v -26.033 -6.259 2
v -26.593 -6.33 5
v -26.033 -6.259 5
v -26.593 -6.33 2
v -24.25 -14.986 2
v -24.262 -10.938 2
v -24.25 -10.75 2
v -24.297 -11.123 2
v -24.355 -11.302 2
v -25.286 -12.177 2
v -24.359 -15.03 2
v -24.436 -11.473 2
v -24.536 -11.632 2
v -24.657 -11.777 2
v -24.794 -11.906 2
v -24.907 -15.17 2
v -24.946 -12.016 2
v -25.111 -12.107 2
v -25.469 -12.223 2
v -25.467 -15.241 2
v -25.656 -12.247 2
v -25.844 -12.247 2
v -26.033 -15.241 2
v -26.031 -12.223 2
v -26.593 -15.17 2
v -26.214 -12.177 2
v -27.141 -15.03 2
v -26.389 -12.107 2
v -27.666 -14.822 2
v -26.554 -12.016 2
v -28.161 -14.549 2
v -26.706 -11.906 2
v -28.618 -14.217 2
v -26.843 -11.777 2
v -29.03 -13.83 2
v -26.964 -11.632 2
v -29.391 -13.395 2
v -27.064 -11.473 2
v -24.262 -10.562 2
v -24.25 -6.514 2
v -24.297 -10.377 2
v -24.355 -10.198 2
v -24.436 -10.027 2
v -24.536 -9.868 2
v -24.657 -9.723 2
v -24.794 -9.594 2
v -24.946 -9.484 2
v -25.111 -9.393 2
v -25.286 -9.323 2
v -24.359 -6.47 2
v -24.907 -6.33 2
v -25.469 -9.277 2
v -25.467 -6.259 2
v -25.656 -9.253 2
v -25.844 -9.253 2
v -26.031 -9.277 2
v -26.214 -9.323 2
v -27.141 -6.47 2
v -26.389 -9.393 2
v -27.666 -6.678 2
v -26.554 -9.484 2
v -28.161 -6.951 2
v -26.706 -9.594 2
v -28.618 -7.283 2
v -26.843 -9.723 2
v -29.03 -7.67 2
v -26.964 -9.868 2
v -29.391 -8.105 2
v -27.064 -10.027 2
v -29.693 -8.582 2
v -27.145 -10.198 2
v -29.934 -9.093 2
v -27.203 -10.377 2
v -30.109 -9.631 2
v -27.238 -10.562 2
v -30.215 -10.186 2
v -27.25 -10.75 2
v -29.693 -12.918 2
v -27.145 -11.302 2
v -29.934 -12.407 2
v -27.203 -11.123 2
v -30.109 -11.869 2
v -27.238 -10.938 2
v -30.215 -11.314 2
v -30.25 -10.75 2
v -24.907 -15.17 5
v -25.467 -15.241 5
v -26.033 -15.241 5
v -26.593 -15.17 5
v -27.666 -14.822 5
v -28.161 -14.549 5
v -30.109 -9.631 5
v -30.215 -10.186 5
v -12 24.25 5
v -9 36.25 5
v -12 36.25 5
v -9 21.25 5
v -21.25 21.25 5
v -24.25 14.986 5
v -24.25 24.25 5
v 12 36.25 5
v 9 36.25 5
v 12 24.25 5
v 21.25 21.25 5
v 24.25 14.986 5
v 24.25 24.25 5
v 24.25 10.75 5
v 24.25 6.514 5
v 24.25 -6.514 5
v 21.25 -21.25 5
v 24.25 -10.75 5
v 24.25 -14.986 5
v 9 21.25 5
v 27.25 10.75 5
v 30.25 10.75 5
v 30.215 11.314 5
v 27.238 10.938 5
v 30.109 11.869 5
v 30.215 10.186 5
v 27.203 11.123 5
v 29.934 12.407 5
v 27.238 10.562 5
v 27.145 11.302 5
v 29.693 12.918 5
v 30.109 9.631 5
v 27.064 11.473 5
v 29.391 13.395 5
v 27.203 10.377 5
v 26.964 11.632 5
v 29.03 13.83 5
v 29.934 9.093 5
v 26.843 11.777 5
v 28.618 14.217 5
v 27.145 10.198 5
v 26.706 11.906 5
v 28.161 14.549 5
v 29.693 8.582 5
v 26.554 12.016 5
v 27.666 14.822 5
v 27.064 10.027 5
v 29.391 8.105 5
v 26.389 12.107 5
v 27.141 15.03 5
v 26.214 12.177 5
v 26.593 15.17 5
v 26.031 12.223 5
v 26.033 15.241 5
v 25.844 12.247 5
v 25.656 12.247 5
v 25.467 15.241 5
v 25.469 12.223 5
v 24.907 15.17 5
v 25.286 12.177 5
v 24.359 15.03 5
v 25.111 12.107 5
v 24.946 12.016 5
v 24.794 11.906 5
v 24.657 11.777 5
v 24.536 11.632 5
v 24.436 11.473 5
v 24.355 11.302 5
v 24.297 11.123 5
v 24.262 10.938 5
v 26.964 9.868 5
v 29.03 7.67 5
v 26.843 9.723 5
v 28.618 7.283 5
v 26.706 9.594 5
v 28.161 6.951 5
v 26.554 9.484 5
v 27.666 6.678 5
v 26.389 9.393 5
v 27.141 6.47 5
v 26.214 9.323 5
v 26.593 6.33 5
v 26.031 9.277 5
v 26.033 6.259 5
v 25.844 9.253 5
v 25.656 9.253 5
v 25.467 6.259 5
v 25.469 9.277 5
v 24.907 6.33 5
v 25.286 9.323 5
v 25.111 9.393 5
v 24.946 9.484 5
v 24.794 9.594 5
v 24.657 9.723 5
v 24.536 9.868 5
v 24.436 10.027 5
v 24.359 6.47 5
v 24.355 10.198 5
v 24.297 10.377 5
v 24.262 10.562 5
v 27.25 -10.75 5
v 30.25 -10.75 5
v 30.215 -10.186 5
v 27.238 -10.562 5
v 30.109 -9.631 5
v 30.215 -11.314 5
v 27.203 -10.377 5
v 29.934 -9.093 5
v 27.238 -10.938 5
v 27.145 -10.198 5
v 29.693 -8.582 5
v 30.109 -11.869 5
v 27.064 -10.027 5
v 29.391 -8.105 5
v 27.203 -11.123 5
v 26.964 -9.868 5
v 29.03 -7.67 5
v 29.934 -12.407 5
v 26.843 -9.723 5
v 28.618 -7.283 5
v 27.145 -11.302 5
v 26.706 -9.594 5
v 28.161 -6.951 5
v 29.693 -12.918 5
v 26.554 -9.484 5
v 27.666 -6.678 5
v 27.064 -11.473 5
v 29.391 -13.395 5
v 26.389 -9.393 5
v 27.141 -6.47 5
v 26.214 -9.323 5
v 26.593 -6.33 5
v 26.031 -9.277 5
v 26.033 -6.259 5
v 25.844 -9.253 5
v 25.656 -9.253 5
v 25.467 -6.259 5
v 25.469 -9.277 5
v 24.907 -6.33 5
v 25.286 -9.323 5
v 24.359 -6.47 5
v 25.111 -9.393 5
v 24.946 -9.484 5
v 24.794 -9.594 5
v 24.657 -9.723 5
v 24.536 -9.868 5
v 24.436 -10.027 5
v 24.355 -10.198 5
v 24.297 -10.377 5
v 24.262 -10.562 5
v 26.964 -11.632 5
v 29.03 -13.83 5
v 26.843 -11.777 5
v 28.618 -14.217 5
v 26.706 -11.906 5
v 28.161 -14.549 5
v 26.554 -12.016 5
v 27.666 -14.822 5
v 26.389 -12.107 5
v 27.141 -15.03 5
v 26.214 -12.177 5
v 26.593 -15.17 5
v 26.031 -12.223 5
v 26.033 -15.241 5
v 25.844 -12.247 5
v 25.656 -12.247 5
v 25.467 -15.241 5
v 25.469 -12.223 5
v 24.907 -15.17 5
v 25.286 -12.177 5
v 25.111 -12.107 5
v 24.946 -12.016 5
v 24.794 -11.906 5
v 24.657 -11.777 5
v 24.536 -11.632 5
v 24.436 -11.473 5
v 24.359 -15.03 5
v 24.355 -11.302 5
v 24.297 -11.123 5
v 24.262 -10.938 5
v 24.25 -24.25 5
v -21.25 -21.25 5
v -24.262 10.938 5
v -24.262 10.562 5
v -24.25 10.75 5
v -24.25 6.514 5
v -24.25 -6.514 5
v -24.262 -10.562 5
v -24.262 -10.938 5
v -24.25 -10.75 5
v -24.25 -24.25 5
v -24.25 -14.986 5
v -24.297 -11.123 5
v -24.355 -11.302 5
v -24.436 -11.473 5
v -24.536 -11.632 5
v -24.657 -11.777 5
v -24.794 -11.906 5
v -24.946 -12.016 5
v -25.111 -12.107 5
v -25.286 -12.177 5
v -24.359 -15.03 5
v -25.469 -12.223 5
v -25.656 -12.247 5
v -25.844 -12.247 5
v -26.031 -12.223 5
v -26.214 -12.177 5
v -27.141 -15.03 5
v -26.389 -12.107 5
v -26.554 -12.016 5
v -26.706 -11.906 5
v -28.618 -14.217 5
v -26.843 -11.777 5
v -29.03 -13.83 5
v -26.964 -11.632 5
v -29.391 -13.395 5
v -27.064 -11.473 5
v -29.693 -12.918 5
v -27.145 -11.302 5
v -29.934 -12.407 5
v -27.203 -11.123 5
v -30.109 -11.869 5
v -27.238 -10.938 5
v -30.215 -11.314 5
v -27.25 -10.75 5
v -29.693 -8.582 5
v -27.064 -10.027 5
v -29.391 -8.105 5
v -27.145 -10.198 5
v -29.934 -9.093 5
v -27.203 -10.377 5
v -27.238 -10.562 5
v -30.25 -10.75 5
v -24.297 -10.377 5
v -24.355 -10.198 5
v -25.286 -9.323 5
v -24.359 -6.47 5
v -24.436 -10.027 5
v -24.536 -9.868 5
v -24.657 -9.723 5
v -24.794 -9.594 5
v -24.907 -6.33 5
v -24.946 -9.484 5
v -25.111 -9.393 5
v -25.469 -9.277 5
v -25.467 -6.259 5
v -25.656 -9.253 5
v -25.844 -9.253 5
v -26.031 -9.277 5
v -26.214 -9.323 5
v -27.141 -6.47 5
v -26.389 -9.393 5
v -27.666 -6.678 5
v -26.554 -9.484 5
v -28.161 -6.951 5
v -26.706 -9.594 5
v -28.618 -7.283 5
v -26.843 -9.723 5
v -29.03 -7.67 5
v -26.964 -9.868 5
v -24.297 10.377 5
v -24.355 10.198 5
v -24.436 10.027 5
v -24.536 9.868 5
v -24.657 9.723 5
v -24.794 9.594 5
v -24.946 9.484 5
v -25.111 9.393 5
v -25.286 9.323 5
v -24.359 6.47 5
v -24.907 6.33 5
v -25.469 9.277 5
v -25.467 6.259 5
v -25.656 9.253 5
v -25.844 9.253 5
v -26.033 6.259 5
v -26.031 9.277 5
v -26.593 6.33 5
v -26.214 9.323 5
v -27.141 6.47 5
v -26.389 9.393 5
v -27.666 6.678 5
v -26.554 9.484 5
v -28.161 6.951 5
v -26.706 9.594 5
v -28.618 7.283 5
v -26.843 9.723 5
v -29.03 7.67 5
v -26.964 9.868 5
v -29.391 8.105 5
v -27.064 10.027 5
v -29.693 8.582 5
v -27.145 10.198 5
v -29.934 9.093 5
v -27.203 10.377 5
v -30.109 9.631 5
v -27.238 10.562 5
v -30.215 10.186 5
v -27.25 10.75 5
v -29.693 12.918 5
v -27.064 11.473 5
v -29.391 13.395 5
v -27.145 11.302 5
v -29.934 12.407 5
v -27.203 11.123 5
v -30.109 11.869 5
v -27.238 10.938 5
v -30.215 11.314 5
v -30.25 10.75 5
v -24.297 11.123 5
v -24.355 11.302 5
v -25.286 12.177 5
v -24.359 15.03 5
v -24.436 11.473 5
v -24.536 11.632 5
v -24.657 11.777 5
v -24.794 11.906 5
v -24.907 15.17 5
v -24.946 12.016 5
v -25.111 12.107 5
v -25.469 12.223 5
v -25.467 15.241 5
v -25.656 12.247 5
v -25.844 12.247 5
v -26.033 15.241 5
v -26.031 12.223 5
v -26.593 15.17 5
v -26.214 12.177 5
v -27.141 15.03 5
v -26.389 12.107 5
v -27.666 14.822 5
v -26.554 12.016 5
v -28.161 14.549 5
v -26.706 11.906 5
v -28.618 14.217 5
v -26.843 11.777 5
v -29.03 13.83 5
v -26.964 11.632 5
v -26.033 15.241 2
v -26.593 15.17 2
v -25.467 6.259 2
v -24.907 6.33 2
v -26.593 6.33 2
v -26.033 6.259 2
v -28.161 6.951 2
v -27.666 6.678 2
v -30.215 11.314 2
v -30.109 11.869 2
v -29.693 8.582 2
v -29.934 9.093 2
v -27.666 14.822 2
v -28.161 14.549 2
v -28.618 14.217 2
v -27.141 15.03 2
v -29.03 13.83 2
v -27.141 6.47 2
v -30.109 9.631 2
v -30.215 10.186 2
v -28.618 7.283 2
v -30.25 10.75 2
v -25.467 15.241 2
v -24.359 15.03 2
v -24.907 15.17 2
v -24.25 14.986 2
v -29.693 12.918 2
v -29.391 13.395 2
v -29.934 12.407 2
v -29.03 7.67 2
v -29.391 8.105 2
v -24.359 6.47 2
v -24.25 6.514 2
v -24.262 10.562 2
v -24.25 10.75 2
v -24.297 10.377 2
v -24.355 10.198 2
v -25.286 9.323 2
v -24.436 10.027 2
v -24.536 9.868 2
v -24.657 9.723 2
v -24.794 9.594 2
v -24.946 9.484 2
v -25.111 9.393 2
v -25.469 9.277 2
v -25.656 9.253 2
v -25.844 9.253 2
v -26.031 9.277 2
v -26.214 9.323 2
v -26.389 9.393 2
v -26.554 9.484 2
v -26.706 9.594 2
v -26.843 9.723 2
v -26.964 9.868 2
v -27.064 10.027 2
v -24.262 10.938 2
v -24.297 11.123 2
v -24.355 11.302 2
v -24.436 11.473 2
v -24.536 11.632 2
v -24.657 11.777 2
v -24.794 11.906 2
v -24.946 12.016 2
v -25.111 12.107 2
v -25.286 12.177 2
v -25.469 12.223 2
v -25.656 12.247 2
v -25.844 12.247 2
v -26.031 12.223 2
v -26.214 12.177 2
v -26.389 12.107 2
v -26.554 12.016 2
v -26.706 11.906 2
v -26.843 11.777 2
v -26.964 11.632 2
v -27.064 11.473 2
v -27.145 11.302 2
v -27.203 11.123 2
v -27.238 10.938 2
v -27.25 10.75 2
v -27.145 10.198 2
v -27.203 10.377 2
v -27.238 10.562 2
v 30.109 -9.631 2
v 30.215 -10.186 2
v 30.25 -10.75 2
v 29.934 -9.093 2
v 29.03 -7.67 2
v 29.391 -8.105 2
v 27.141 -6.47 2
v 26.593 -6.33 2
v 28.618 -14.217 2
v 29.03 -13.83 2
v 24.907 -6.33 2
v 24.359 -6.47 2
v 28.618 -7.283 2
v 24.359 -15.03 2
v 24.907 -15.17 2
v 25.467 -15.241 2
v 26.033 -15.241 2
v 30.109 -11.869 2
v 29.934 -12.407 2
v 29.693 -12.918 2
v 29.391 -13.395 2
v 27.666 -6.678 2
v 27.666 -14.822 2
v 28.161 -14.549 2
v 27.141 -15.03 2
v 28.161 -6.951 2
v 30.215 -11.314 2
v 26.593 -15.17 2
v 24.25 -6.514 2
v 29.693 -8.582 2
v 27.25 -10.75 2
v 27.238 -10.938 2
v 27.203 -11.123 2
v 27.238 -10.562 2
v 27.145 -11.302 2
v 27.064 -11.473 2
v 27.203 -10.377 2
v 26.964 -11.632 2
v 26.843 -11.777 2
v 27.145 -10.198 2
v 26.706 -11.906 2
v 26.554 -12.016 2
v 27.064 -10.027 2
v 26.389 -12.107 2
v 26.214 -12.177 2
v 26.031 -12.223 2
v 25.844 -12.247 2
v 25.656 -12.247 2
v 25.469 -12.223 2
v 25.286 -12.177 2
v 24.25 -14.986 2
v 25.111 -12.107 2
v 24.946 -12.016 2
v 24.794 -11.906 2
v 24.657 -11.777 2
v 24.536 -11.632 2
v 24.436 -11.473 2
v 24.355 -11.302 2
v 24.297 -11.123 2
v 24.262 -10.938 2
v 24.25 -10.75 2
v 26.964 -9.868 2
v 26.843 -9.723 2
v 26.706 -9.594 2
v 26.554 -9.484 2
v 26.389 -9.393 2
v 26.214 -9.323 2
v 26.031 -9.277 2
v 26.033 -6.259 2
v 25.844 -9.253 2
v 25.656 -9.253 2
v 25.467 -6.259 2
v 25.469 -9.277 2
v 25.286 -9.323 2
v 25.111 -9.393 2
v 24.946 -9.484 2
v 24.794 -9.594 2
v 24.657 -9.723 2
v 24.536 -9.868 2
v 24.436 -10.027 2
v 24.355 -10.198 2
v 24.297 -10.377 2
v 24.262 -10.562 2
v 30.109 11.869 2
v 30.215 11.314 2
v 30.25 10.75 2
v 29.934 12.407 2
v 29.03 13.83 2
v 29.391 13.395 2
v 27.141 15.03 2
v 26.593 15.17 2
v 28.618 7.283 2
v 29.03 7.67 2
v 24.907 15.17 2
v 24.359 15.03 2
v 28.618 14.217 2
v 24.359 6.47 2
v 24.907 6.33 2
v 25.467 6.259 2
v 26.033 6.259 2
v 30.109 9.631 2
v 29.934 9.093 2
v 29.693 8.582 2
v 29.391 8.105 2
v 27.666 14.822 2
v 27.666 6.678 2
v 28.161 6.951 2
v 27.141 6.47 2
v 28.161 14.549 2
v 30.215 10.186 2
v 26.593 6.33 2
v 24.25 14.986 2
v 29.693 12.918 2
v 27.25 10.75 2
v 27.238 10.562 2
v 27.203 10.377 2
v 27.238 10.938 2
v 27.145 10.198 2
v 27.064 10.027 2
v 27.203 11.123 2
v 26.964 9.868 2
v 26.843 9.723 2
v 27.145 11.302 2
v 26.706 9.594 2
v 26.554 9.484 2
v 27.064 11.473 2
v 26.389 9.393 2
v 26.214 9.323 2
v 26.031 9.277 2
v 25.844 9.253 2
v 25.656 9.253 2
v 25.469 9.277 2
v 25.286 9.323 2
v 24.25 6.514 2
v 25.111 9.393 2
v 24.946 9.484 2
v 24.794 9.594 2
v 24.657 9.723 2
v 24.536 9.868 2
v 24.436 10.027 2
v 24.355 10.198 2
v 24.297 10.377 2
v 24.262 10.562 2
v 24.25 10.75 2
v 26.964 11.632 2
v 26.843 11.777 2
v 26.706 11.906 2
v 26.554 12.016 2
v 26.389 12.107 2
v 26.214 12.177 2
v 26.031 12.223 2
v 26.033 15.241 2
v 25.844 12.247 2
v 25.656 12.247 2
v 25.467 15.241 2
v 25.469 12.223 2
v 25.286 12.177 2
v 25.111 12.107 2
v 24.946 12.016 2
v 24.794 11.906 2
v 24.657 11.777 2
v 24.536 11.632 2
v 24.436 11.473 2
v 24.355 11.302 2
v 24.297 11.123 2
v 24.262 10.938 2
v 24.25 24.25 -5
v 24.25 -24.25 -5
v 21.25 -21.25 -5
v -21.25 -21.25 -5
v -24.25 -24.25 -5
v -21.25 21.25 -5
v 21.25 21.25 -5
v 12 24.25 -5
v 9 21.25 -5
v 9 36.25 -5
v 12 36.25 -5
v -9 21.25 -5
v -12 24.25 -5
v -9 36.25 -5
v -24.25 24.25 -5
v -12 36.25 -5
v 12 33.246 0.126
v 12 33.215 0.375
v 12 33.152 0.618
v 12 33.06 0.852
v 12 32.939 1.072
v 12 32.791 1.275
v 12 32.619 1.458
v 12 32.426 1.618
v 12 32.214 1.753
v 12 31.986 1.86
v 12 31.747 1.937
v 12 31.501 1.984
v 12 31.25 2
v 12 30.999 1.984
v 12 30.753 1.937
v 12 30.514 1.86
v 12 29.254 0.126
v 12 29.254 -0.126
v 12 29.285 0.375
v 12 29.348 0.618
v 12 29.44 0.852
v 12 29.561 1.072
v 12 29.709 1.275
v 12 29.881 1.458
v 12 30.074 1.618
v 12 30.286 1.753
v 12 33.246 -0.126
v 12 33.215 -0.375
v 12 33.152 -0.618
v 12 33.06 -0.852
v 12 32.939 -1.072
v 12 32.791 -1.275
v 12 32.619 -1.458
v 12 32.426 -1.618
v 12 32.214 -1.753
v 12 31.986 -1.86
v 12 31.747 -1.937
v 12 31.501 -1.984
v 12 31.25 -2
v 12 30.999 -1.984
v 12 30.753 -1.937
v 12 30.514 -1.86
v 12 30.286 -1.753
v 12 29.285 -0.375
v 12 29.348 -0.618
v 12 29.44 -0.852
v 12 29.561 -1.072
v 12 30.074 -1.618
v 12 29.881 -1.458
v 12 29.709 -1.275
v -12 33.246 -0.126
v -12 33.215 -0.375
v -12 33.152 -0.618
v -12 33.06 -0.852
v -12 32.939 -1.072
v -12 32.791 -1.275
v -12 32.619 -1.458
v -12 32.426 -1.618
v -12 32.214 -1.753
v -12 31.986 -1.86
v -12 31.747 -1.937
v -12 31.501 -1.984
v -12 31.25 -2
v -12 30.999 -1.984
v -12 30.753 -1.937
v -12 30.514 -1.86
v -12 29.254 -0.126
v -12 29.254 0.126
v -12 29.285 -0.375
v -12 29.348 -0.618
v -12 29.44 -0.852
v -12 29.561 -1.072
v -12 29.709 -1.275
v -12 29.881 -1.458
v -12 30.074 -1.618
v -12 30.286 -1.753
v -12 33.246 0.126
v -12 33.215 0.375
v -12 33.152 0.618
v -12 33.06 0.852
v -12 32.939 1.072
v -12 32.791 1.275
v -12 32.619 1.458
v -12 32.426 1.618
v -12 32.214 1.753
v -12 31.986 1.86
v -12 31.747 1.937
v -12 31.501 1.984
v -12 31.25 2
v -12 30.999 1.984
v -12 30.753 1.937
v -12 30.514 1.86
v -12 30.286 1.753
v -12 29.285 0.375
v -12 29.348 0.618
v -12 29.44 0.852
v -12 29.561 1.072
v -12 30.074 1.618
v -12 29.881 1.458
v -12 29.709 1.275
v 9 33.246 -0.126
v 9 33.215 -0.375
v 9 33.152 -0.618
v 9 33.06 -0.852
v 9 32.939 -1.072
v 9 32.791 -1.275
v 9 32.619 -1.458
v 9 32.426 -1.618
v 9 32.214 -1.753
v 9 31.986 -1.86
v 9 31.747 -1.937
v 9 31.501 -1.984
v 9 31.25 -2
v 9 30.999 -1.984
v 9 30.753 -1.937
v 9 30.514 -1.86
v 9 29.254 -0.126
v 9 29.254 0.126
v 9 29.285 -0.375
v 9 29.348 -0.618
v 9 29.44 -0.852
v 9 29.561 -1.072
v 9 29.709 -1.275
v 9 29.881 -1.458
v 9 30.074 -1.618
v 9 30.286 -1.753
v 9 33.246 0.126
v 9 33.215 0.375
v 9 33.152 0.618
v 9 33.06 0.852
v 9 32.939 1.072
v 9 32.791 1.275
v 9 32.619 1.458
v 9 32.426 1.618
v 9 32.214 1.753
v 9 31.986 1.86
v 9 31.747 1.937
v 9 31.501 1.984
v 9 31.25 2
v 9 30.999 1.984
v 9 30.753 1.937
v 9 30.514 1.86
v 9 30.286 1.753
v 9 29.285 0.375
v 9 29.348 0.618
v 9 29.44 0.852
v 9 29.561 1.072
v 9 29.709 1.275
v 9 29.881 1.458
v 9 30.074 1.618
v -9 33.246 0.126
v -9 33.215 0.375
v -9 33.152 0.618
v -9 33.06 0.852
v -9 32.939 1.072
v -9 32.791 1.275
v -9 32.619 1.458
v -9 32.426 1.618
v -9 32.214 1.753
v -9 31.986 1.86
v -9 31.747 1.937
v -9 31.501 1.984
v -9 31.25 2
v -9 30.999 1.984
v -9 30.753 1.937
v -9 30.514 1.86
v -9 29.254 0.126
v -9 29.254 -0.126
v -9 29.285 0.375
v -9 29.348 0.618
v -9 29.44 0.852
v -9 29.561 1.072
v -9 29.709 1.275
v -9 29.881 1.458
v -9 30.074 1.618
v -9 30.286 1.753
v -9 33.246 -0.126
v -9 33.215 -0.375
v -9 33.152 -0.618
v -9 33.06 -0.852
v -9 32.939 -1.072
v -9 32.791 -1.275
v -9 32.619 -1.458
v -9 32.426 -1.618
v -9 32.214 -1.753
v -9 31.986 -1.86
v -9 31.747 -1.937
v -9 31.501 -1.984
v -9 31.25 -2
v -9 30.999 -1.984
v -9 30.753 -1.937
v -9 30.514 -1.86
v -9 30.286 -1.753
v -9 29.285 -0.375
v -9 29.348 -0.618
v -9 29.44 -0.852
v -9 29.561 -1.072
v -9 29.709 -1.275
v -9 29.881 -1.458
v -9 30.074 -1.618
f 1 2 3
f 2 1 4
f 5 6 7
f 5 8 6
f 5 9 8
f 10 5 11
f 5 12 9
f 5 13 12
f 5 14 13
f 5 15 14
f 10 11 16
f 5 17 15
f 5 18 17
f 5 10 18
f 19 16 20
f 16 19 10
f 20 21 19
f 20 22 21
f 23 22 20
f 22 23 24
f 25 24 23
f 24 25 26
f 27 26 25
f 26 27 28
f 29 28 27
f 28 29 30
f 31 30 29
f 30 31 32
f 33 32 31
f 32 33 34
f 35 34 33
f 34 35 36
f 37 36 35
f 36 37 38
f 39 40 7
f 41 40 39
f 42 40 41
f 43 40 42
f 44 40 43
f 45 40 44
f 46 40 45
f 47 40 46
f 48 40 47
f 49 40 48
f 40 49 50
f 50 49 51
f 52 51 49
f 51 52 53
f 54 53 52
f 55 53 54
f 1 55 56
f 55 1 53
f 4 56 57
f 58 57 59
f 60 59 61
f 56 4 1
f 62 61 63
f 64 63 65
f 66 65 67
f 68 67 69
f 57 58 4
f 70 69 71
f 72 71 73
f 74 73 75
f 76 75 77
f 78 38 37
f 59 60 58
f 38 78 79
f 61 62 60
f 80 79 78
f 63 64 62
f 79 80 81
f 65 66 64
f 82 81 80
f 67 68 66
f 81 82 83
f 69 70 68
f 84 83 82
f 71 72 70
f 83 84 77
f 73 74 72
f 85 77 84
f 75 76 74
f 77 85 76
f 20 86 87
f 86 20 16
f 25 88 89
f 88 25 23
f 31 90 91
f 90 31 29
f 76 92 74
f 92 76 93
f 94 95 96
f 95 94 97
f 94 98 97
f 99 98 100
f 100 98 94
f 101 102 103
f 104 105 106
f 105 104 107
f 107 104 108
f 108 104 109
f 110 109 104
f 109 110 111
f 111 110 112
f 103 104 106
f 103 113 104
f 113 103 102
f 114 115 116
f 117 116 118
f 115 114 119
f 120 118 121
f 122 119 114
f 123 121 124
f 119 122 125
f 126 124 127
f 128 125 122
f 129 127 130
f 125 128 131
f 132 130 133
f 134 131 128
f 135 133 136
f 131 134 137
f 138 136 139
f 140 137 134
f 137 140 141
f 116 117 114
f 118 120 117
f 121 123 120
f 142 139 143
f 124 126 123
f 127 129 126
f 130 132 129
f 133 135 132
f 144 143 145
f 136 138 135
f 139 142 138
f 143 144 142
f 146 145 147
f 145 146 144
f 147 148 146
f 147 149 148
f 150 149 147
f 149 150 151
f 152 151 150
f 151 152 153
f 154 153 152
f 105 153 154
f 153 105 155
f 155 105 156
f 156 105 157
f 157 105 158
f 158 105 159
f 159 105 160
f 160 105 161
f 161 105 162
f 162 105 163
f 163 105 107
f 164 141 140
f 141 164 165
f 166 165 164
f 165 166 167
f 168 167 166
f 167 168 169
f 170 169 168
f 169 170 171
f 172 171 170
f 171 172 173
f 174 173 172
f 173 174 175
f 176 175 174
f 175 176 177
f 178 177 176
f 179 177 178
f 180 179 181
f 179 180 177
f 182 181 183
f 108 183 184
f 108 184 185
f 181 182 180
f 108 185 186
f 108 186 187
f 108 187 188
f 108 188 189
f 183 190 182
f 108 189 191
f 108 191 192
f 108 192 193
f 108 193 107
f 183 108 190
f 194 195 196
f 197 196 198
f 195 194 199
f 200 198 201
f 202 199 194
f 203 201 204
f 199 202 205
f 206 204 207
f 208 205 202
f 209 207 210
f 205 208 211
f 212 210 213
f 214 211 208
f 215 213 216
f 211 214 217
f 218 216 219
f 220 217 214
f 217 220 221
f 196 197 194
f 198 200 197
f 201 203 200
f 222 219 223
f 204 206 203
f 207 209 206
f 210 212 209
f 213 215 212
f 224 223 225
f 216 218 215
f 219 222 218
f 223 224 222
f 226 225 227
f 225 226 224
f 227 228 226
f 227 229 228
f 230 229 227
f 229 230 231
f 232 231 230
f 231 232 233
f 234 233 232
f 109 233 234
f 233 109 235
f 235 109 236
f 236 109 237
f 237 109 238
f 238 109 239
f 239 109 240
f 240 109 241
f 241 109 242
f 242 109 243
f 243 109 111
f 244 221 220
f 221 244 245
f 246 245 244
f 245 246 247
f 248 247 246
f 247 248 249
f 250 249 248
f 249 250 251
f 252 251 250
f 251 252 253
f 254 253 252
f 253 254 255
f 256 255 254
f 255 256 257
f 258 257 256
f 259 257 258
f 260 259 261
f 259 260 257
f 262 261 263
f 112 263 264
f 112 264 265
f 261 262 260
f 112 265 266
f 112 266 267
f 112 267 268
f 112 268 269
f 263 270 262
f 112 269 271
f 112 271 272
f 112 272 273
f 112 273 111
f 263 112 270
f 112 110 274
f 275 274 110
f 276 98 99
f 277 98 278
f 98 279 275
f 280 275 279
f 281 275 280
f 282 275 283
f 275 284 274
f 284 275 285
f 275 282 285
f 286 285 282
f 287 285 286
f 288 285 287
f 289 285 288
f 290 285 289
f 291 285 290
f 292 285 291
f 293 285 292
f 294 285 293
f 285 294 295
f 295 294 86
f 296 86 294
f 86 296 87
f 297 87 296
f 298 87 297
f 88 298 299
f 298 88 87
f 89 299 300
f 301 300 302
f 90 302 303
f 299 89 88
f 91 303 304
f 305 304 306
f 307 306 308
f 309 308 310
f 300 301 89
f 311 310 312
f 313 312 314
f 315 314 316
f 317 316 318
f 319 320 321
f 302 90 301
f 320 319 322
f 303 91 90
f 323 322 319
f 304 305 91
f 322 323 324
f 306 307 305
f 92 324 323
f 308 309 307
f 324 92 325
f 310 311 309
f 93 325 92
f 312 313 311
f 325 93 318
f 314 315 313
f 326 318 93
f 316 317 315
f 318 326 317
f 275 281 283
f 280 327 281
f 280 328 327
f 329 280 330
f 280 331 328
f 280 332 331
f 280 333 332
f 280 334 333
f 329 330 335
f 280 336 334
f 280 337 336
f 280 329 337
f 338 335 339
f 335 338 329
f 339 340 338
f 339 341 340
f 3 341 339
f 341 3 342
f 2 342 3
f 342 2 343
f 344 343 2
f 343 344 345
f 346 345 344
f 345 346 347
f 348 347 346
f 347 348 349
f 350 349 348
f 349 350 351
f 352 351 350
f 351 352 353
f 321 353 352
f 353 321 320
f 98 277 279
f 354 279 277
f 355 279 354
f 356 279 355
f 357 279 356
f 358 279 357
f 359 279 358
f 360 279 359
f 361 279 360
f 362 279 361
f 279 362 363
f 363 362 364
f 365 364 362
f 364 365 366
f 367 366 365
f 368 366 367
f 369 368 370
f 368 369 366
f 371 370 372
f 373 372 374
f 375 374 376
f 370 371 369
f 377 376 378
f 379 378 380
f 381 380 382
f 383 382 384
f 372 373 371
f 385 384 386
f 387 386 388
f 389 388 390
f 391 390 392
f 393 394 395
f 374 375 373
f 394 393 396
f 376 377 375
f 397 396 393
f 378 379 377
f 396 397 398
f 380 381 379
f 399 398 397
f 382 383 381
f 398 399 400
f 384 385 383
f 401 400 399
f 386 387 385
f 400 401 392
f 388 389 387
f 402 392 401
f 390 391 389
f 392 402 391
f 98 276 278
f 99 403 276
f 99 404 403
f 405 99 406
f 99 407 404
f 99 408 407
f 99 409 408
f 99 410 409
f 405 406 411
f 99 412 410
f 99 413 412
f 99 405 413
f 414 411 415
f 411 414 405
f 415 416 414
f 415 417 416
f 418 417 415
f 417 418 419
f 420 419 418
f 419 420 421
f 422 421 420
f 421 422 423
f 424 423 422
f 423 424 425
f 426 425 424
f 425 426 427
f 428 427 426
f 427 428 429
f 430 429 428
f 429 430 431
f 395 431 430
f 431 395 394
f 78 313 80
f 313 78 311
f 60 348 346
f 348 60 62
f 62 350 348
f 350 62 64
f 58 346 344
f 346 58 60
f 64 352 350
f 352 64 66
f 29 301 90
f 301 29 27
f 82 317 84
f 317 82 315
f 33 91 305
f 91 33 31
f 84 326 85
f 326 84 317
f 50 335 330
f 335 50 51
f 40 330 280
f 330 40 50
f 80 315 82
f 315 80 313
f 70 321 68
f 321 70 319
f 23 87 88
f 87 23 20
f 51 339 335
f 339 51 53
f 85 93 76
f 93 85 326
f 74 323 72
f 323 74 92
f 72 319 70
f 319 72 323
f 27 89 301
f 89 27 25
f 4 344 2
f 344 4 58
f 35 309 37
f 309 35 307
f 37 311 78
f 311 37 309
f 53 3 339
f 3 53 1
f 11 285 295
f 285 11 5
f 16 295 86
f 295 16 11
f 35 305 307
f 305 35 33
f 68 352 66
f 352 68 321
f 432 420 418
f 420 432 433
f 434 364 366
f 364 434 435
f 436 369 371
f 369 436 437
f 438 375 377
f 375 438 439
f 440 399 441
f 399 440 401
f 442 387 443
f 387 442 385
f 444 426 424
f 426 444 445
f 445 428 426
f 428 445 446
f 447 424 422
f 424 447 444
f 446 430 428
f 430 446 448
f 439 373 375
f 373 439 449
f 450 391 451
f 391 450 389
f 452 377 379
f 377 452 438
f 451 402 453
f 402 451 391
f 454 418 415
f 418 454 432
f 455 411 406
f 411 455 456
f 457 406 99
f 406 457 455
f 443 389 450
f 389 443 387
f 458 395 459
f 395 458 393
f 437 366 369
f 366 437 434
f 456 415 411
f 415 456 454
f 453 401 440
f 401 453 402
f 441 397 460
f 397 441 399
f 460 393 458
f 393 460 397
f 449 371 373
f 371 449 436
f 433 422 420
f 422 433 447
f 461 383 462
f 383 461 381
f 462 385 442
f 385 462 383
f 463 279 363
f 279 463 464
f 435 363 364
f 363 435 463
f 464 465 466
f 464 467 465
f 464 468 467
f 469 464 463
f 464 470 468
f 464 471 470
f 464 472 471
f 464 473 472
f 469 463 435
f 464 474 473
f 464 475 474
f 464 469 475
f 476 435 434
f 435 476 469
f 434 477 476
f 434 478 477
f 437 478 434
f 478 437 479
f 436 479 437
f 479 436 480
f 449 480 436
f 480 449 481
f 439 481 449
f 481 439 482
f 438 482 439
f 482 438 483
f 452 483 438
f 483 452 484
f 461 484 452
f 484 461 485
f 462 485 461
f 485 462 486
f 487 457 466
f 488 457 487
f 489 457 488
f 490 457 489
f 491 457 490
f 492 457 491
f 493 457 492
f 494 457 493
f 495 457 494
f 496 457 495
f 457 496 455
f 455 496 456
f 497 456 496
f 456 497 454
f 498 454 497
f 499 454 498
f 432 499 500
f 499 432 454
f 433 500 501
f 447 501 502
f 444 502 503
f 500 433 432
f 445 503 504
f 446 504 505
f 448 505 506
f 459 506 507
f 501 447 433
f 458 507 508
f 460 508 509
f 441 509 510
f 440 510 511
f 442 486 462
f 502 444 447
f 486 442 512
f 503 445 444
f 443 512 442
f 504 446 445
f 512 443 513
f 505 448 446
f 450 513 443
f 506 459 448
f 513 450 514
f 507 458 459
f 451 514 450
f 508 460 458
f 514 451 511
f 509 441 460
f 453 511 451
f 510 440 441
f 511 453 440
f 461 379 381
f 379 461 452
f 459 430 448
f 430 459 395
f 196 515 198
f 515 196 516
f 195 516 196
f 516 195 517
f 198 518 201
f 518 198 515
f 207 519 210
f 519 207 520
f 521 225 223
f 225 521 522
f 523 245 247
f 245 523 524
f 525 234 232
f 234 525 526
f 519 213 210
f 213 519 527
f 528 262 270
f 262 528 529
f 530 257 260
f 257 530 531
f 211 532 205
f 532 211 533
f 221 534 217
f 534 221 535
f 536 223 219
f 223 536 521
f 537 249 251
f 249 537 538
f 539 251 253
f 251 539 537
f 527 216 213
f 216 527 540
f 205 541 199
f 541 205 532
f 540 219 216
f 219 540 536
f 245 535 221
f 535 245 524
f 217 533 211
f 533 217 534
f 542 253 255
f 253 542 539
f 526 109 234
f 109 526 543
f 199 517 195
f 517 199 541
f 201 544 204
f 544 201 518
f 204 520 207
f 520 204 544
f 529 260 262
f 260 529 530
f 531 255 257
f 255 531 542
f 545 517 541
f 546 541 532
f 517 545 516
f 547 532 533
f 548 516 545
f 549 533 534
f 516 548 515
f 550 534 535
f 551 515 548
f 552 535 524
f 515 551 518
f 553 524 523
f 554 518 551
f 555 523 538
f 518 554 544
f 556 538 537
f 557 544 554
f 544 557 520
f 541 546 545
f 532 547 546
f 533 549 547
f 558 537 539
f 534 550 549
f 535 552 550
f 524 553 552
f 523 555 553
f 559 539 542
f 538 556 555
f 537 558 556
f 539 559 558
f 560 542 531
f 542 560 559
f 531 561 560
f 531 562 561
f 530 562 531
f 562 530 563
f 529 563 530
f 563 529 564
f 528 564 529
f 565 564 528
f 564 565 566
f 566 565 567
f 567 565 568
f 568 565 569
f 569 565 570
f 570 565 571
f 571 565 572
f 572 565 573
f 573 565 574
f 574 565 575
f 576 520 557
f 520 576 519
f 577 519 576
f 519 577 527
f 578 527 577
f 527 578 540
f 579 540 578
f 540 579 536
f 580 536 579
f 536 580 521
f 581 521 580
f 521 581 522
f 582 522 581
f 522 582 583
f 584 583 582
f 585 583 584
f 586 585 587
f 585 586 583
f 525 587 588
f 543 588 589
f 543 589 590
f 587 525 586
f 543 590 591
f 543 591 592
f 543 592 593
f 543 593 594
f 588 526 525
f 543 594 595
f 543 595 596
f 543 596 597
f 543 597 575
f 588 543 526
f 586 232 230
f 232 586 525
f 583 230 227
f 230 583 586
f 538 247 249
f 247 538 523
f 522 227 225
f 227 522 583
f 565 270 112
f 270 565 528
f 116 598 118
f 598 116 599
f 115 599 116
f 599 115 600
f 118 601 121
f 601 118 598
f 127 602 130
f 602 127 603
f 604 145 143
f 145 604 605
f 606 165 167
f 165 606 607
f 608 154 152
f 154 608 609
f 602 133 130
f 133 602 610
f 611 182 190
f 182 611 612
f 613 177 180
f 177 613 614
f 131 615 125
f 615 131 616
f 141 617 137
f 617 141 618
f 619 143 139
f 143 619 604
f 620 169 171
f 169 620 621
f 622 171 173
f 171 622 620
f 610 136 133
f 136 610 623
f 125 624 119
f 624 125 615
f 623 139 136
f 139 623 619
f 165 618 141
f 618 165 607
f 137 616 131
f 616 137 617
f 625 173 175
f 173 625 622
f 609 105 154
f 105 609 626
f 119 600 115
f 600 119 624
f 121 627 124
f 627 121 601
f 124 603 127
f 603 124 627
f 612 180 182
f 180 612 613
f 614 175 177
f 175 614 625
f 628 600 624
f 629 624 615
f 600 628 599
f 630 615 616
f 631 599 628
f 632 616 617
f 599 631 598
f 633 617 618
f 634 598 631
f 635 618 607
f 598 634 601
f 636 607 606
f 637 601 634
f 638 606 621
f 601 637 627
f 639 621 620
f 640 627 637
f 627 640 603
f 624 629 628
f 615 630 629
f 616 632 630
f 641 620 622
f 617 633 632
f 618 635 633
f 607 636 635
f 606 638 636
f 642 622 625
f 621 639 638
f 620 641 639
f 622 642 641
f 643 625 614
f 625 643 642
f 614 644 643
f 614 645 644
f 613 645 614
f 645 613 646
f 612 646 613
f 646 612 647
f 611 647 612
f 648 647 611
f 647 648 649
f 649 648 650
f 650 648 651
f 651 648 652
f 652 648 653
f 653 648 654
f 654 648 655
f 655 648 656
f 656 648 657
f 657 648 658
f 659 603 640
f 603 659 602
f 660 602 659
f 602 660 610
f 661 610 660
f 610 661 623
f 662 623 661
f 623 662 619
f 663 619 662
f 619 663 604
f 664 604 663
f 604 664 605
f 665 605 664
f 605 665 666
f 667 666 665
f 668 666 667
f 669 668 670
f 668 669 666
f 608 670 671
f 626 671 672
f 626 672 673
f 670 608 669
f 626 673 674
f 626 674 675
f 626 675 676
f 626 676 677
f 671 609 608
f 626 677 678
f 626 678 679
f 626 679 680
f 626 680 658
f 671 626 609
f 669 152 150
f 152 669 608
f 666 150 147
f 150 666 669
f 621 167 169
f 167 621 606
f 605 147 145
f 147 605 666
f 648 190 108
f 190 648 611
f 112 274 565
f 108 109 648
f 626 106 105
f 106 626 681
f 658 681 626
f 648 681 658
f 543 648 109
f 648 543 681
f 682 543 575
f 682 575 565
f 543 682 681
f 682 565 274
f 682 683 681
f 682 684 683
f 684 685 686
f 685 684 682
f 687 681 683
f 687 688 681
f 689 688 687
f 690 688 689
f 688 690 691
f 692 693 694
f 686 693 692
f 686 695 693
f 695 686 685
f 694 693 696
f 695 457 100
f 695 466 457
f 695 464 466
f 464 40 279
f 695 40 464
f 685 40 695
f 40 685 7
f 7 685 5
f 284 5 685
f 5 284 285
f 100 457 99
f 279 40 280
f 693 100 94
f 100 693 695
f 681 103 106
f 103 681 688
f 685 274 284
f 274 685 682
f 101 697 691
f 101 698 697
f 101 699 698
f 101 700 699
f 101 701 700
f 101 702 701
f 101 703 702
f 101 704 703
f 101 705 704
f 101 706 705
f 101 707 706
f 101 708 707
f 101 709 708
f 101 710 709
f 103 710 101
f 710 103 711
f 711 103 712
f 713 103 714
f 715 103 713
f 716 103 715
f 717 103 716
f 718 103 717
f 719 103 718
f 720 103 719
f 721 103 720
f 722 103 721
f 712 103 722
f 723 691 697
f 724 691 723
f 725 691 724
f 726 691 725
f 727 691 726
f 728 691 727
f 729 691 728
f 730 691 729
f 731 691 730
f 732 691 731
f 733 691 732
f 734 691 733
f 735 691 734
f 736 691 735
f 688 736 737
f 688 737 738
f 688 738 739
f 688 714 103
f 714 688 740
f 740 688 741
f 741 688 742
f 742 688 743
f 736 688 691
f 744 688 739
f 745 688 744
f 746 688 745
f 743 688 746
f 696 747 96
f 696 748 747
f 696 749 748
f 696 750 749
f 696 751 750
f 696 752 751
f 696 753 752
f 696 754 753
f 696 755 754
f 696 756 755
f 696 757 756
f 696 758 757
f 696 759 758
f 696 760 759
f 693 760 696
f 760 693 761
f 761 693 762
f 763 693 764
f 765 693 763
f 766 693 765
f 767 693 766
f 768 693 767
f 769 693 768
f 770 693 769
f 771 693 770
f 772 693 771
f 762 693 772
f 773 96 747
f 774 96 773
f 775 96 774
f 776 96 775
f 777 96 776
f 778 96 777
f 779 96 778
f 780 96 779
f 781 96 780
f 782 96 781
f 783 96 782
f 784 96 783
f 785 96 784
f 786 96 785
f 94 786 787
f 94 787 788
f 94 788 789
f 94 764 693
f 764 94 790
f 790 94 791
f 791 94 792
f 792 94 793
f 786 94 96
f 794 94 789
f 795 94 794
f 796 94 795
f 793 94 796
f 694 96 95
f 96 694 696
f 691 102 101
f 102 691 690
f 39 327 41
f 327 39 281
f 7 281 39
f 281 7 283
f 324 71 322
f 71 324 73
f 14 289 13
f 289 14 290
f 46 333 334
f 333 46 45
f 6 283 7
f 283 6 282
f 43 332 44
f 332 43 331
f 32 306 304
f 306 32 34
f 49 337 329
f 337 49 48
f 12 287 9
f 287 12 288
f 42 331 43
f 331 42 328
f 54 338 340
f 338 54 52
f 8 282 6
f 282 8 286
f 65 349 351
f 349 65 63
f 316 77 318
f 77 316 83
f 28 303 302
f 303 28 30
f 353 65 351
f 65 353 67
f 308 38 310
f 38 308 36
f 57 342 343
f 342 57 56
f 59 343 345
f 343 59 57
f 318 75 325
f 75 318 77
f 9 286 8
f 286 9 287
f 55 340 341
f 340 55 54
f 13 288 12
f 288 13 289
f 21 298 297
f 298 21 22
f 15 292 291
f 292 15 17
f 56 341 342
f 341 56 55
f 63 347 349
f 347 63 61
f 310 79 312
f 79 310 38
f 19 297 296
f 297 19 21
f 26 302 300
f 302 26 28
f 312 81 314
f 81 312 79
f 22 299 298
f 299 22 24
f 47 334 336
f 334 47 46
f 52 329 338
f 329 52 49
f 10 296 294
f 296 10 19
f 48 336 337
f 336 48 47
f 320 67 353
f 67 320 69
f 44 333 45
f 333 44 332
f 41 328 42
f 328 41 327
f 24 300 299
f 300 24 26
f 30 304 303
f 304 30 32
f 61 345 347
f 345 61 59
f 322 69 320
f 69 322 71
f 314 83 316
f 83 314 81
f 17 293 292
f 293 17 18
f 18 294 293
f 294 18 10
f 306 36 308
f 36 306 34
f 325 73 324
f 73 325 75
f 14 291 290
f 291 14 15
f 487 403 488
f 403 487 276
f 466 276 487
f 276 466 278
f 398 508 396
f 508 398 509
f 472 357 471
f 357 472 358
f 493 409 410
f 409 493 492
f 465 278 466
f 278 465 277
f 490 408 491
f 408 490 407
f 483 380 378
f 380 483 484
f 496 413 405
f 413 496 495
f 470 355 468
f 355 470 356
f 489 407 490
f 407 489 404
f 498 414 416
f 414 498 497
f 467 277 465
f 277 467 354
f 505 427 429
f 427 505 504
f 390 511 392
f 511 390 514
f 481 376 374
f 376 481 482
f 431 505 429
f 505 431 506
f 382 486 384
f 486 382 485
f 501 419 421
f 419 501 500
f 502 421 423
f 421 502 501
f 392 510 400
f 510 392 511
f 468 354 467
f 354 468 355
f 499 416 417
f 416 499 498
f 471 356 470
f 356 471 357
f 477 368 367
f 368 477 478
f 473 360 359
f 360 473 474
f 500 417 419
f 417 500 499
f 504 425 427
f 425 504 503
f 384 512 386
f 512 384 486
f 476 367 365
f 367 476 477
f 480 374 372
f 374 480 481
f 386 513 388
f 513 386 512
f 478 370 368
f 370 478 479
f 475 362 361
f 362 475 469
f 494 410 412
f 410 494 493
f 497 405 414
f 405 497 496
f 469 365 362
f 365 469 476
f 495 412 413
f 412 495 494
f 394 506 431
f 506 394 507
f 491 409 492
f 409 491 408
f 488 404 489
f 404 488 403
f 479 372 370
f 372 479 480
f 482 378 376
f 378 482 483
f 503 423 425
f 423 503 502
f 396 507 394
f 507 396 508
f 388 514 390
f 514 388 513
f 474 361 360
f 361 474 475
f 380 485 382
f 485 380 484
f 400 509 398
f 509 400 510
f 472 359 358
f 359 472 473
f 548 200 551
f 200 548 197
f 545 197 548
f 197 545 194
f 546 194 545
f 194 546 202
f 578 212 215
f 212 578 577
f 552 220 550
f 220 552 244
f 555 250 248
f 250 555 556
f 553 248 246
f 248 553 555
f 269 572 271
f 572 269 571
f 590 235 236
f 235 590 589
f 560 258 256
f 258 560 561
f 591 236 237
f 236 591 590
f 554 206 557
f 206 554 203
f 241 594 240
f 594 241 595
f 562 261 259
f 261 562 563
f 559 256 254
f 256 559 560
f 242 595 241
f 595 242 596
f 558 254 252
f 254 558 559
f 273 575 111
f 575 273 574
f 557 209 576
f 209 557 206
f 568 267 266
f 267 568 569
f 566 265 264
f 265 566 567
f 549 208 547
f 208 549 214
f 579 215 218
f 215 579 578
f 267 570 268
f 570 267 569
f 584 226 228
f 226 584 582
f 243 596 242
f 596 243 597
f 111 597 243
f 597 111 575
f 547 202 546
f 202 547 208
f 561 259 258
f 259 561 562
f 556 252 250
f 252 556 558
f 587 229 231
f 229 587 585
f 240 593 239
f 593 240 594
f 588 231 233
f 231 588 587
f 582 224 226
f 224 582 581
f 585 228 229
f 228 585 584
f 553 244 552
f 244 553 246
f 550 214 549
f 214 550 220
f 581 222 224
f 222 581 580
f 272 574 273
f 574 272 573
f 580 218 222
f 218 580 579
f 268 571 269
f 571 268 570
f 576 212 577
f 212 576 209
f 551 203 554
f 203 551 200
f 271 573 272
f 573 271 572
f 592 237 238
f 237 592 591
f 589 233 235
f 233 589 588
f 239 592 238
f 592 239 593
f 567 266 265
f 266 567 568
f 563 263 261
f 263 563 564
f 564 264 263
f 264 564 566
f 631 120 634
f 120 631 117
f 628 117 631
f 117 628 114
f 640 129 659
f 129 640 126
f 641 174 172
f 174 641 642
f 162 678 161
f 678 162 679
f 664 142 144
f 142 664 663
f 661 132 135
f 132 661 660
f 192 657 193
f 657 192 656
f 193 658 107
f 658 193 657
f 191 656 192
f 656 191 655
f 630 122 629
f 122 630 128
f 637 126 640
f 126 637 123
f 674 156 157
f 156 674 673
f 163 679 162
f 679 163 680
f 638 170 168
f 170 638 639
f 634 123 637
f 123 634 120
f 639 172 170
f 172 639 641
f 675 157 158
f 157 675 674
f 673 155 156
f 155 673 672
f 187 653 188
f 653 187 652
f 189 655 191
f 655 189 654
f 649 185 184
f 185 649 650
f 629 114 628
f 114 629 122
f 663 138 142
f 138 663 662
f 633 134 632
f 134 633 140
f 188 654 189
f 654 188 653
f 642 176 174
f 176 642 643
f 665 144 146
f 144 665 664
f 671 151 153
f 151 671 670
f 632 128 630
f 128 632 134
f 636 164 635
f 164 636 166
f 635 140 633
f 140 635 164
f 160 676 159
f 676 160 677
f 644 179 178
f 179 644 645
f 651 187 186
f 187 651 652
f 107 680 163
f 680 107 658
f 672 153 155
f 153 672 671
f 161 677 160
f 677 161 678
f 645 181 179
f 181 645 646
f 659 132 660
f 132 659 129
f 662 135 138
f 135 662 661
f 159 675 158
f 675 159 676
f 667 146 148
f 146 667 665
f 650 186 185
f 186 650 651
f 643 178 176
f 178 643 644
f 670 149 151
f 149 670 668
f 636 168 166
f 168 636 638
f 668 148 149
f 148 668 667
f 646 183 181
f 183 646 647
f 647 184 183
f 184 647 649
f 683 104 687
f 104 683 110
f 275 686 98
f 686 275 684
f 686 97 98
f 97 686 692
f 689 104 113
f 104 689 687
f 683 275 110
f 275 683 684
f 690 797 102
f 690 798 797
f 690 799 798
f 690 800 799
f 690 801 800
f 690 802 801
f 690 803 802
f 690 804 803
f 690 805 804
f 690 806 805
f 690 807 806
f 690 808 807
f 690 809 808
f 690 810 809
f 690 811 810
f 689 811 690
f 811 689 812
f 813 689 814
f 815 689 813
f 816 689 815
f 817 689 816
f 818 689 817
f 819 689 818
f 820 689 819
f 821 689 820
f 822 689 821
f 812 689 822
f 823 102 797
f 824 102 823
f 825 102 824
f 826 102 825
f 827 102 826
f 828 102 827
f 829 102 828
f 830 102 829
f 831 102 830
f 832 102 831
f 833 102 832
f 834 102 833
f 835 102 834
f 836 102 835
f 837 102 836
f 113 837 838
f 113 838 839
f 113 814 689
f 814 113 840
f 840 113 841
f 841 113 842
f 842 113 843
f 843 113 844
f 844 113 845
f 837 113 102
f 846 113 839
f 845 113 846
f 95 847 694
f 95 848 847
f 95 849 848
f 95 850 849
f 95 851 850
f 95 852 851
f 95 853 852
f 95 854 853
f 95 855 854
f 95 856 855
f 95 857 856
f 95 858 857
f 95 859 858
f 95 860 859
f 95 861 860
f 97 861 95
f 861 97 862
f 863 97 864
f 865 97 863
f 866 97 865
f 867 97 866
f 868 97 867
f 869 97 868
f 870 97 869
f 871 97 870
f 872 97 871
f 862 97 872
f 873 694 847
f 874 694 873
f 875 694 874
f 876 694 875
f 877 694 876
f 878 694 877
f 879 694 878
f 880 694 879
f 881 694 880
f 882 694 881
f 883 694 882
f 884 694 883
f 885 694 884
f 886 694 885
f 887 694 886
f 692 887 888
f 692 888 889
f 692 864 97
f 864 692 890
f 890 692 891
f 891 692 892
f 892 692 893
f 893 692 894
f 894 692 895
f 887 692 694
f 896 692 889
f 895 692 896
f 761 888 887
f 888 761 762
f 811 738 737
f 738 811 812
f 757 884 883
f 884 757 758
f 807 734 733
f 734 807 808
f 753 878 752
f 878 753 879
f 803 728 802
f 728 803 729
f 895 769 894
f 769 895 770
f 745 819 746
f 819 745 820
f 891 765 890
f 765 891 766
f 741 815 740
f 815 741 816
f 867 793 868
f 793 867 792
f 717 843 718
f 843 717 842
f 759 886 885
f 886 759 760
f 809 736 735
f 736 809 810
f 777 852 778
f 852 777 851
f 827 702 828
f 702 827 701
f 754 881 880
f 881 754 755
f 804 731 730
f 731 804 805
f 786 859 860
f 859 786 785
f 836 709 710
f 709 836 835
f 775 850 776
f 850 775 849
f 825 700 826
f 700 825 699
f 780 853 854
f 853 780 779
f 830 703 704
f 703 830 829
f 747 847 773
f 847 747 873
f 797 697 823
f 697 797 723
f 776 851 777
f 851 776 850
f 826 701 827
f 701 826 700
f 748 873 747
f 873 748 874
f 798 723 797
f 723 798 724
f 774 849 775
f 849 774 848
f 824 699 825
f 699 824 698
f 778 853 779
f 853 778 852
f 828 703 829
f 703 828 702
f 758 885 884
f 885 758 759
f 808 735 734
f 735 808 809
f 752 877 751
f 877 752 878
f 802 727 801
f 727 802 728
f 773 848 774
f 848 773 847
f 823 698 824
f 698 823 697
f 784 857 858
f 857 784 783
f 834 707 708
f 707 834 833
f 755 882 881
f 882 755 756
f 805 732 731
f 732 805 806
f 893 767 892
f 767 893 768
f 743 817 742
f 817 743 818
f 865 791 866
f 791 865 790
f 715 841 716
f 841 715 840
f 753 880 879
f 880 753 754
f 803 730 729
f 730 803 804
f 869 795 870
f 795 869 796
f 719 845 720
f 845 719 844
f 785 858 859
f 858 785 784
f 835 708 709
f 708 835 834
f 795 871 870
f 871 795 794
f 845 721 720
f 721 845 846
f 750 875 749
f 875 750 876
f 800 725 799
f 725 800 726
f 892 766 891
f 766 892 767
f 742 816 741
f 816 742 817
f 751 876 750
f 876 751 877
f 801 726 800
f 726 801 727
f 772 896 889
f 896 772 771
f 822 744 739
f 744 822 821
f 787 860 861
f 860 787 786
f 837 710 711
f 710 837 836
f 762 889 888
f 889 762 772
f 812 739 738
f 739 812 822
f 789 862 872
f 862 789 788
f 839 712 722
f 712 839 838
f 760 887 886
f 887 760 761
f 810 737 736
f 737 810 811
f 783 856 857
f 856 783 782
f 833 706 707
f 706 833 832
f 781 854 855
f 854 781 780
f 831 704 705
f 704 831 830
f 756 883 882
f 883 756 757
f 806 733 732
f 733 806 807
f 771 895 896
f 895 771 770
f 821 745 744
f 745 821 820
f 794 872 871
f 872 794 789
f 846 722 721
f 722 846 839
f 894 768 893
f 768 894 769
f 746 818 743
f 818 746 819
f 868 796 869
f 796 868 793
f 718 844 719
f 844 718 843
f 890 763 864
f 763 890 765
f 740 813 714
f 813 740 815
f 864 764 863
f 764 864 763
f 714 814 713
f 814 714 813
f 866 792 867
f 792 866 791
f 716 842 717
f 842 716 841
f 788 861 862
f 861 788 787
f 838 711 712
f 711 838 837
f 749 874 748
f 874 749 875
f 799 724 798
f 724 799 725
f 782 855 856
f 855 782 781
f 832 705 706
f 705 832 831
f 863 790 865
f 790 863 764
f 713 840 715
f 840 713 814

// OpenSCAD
NEMA_WIDTH = 42.5;
WALL_THICKNESS = 3;
THICKNESS = 10;

NEMA_SLOT_WIDTH = 18;
NEMA_SLOT_LENGTH = 10;
NEMA_SLOT_HOLE_DIA = 4;

MOUNTING_HOLE_DIA = 3;
MOUNTING_HOLE_THICKNESS = 3;
MOUNTING_HOLE_SPACING_X = 51.5;
MOUNTING_HOLE_SPACING_Y = 21.5;

$fn = 50;

module mounting_holes(dia) {
    for(i = [-1, 1]) {
        for(j = [-1, 1]) {
            translate([i * MOUNTING_HOLE_SPACING_X/2, j * MOUNTING_HOLE_SPACING_Y/2, THICKNESS/2 - MOUNTING_HOLE_THICKNESS])
            cylinder(d = dia, h = MOUNTING_HOLE_THICKNESS);
        }
    }
}

difference() {
    w = NEMA_WIDTH + 2 * WALL_THICKNESS;

    union() {
        cube(size = [w, w, THICKNESS], center = true);

        mounting_holes(MOUNTING_HOLE_DIA + 2 * WALL_THICKNESS);

        translate([0, NEMA_SLOT_LENGTH, 0])
        cube(size = [NEMA_SLOT_WIDTH + 2 * WALL_THICKNESS, NEMA_WIDTH + NEMA_SLOT_LENGTH, THICKNESS], center = true);
    }

    cube(size = [NEMA_WIDTH, NEMA_WIDTH, THICKNESS], center = true);

    translate([0, NEMA_WIDTH, 0])
    cube(size = [NEMA_SLOT_WIDTH, NEMA_WIDTH * 2, THICKNESS], center = true);

    mounting_holes(MOUNTING_HOLE_DIA);

    translate([0, NEMA_SLOT_LENGTH + NEMA_WIDTH/2, 0])
    rotate([0, 90, 0])
    cylinder(d = NEMA_SLOT_HOLE_DIA, h = NEMA_SLOT_WIDTH * 2, center = true);
}
